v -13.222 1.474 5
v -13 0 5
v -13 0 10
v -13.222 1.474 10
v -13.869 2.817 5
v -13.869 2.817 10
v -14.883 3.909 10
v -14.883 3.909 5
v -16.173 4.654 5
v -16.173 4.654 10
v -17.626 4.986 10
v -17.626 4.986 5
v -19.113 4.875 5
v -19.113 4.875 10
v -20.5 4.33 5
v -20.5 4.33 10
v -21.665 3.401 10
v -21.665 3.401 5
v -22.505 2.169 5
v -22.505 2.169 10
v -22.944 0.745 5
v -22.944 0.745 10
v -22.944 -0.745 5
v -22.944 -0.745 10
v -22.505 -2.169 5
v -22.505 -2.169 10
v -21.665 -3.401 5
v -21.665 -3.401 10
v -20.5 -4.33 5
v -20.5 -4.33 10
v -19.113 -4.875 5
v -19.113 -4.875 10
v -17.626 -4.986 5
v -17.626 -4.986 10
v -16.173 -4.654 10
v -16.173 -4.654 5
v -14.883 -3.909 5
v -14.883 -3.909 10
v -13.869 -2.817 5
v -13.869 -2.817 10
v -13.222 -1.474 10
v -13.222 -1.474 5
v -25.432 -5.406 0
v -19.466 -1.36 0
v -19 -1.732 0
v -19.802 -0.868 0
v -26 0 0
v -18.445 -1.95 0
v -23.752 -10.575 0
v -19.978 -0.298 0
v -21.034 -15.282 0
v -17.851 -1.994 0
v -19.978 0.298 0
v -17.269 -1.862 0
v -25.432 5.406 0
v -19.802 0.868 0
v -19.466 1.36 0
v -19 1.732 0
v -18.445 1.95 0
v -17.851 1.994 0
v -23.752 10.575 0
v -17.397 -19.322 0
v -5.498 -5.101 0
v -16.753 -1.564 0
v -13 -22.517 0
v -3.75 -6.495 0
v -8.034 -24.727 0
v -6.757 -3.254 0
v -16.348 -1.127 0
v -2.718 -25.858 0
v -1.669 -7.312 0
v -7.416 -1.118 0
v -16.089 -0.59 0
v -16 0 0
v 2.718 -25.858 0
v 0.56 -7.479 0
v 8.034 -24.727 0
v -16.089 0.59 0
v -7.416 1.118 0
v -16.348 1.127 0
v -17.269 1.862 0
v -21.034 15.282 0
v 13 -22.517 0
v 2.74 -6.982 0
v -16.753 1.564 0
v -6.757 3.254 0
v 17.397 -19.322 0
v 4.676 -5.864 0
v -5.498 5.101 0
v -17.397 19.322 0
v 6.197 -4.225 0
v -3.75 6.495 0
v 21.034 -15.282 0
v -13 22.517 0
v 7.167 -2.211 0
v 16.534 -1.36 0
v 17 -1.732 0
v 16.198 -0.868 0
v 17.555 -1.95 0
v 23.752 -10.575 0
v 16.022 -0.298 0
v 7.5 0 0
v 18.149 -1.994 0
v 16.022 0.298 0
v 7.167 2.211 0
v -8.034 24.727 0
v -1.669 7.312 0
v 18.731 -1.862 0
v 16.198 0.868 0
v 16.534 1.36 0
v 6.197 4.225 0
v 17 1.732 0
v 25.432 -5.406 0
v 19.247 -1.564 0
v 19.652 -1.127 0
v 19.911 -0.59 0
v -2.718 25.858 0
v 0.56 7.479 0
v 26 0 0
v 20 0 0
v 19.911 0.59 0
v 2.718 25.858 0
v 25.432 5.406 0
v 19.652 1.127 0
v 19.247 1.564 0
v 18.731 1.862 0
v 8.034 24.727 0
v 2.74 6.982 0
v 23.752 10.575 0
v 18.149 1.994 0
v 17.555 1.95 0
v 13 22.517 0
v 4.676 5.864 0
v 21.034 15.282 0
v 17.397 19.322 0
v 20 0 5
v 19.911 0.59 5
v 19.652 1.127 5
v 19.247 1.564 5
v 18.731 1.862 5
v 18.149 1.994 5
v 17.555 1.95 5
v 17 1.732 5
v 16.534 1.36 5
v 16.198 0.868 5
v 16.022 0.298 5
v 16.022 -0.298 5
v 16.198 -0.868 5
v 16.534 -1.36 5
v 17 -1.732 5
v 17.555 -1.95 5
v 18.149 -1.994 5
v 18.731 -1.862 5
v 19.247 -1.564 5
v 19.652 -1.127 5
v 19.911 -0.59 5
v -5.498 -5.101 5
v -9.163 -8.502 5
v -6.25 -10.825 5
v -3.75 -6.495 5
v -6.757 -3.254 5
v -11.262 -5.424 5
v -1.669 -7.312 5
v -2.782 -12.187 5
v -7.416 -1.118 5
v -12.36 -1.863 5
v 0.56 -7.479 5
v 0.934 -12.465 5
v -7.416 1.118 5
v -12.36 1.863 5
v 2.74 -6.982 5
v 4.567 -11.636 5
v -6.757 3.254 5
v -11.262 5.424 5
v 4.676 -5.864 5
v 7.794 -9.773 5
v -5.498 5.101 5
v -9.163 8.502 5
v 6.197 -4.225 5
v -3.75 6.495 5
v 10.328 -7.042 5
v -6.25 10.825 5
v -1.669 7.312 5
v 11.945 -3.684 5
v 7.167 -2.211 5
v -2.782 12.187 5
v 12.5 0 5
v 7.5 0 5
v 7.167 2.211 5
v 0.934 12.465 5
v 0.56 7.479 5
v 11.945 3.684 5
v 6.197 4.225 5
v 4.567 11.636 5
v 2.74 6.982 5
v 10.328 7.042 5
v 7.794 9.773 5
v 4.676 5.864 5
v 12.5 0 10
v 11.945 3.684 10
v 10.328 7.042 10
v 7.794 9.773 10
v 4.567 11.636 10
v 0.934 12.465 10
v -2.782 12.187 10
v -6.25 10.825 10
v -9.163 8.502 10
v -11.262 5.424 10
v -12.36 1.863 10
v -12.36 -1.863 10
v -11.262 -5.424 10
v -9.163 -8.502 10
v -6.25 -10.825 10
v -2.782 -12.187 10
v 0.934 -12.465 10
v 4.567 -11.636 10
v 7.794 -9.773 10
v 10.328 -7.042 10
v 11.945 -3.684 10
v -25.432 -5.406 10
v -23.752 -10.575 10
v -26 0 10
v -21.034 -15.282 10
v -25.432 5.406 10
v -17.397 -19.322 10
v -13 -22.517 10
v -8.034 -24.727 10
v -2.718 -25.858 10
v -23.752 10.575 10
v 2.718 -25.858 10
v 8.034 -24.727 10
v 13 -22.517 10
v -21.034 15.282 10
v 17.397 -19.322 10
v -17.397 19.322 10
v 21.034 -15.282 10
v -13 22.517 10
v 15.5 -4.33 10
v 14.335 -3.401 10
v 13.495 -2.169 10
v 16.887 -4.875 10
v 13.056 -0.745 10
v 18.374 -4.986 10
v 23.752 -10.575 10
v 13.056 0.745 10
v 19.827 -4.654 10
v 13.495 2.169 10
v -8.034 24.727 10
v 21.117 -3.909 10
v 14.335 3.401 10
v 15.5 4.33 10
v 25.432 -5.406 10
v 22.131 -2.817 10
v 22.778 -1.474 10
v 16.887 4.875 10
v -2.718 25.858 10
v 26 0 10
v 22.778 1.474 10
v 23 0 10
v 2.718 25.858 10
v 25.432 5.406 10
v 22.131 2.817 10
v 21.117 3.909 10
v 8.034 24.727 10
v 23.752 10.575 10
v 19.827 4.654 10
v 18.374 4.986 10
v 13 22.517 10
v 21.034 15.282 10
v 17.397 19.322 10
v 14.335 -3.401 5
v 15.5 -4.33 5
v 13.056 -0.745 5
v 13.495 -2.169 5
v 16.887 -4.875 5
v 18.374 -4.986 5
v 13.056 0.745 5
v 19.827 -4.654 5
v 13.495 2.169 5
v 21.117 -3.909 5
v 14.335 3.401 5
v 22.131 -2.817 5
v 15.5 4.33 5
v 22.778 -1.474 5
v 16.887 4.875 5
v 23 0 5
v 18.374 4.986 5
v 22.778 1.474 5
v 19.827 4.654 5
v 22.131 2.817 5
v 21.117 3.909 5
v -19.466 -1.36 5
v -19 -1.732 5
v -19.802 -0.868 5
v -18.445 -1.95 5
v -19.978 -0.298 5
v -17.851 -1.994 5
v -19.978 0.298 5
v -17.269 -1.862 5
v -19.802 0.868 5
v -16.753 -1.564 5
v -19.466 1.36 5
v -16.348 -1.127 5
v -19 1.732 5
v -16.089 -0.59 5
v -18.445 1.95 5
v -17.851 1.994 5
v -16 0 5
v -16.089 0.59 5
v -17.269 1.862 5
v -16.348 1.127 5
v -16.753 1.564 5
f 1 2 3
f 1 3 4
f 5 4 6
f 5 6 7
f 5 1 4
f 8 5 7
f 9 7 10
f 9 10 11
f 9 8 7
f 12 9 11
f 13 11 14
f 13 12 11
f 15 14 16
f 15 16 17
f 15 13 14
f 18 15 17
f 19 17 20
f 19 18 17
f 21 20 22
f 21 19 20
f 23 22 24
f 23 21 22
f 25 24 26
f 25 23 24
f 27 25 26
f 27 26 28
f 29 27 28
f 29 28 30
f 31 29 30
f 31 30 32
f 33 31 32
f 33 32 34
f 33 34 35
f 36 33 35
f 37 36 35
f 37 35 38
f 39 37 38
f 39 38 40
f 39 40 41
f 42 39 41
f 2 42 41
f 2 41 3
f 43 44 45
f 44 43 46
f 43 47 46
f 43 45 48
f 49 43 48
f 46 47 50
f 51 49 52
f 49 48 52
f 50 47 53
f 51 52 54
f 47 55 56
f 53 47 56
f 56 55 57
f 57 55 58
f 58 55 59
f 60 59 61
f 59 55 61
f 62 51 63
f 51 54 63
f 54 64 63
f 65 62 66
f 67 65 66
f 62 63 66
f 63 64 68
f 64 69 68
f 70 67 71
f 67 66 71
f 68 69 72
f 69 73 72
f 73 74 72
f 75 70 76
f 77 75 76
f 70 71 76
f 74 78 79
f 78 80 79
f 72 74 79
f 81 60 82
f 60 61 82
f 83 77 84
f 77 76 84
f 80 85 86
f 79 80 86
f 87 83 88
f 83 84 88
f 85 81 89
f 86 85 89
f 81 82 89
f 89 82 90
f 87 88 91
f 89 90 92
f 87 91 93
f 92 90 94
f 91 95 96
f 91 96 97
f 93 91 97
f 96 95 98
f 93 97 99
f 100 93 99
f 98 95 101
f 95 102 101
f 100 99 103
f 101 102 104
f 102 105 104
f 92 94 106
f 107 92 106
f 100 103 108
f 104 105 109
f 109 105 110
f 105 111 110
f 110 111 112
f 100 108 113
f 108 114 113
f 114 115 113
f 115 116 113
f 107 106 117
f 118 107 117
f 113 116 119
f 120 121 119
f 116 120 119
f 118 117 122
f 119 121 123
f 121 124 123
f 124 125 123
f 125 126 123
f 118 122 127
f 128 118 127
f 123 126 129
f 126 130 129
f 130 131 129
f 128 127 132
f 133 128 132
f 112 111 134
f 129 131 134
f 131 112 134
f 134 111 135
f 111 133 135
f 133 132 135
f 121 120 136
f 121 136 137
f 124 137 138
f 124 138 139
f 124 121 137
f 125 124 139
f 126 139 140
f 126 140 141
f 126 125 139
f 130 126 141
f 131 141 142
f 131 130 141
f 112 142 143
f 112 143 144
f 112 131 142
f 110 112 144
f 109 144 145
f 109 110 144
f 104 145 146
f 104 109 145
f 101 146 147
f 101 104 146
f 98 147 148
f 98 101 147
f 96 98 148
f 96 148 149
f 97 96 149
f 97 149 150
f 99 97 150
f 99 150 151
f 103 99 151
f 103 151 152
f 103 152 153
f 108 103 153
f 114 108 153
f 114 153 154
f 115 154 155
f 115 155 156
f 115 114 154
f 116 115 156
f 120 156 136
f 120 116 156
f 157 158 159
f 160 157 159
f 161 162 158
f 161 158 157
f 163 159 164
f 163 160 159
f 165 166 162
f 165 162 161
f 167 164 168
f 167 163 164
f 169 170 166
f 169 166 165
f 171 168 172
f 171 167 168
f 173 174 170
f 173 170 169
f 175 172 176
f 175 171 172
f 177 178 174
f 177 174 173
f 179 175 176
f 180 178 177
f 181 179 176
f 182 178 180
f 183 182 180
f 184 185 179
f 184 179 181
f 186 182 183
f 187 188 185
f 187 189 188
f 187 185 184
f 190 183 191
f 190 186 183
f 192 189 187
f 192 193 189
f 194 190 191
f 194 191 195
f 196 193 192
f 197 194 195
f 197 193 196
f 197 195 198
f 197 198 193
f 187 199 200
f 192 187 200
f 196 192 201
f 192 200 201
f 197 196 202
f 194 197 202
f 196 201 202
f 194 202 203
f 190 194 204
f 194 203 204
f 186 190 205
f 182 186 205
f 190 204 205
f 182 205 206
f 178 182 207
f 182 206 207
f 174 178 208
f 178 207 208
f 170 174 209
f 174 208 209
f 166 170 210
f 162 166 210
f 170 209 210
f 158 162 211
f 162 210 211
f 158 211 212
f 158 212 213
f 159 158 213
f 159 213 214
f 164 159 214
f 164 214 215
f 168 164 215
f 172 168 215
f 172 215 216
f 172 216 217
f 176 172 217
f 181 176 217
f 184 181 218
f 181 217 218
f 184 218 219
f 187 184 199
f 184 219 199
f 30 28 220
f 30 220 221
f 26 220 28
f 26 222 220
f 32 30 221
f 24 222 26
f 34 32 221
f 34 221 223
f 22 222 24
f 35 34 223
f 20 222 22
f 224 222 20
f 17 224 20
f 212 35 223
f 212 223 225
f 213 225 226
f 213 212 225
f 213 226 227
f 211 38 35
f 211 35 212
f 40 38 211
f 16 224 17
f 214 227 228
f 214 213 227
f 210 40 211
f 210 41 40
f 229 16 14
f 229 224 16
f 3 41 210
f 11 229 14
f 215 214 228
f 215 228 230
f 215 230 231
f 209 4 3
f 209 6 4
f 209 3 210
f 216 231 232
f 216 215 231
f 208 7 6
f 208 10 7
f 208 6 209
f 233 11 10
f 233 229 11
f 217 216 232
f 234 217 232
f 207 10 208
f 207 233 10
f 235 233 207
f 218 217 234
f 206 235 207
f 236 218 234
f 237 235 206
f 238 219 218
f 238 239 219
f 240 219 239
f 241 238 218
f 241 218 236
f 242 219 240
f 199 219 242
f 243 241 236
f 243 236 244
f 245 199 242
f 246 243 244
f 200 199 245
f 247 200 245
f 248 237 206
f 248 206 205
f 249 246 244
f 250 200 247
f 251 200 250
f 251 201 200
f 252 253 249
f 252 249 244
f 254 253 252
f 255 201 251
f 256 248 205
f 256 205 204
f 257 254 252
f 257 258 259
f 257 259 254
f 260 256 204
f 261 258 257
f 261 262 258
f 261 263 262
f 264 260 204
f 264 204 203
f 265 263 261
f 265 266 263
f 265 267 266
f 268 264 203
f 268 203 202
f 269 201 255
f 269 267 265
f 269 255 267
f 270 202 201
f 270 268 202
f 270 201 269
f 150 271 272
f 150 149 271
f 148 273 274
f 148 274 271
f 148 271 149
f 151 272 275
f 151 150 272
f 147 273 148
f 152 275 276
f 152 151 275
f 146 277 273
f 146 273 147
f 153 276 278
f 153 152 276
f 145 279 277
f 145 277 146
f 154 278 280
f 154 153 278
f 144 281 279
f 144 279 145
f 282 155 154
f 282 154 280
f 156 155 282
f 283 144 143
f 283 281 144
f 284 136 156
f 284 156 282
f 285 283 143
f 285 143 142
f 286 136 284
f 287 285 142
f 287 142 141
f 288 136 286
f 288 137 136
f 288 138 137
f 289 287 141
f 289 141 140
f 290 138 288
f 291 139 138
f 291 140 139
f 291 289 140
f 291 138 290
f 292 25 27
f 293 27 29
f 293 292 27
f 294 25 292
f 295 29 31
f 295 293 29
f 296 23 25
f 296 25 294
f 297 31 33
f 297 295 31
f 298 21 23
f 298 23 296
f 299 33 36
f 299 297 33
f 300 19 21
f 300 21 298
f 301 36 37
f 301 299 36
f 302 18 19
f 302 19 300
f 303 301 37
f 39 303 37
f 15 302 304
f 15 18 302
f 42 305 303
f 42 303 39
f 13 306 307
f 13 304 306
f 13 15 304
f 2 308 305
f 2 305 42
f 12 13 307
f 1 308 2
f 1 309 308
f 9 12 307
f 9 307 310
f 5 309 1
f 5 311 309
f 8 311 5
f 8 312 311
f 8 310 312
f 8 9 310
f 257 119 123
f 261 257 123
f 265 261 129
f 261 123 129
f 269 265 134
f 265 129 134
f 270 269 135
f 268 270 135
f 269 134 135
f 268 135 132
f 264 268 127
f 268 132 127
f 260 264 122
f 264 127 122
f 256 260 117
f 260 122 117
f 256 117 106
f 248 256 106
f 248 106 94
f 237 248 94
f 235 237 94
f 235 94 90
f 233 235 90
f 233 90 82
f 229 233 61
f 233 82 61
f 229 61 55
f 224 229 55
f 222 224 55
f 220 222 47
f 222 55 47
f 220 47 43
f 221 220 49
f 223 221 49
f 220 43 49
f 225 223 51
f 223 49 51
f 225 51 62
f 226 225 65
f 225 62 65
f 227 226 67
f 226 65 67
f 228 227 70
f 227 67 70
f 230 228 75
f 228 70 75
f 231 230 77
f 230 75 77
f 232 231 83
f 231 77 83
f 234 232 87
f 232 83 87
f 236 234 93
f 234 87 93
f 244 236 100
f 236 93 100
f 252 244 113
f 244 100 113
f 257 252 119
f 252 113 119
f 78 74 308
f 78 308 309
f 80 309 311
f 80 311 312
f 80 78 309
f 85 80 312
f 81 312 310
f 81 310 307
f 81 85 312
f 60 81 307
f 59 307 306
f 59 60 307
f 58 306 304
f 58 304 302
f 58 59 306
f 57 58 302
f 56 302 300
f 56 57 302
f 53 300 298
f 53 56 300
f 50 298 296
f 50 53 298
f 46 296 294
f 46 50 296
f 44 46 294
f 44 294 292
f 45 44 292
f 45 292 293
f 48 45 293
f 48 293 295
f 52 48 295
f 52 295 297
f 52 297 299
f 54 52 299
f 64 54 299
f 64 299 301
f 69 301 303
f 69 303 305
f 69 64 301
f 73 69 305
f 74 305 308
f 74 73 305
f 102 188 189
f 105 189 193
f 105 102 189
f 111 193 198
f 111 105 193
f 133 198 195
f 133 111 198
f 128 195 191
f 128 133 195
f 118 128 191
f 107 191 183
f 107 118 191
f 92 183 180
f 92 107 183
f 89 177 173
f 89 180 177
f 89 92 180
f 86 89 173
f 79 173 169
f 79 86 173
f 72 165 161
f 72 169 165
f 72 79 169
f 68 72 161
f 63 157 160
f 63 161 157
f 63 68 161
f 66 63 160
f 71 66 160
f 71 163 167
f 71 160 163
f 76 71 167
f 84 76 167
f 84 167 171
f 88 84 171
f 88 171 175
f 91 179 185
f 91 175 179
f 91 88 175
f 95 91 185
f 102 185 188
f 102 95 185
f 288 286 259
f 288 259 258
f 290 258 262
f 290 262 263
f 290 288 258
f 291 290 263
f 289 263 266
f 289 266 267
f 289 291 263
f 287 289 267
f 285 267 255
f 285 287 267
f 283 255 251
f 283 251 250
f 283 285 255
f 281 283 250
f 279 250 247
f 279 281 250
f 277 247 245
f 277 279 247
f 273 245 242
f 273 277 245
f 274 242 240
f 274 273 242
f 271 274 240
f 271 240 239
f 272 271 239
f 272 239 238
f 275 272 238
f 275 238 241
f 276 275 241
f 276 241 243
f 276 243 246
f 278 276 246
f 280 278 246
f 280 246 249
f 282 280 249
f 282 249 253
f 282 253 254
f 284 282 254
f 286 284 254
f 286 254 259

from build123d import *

# Parameters (mm, degrees)
SKETCH_4_R          = 26
SKETCH_4_R_2        = 5
SKETCH_4_R_3        = 7.5
EXTRUDE_2_DEPTH     = 10
SKETCH_4_4_R        = 5
SKETCH_4_4_R_2      = 2
EXTRUDE_3_DEPTH     = 5
SKETCH_5_R          = 12.5
CUT_EXTRUDE_3_DEPTH = 5


with BuildPart() as part:
    # 草图4 → 凸台-拉伸2 (new body)
    with BuildSketch(Plane.XY):
        Circle(SKETCH_4_R)
        with Locations((-18, 0)):
            Circle(SKETCH_4_R_2, mode=Mode.SUBTRACT)
        Circle(SKETCH_4_R_3, mode=Mode.SUBTRACT)
        with Locations((18, 0)):
            Circle(SKETCH_4_R_2, mode=Mode.SUBTRACT)
    extrude(amount=EXTRUDE_2_DEPTH)

    # 草图4<4> → 凸台-拉伸3 (add)
    # profile 1 of 2: a face of its own
    with BuildSketch(Plane.XY):
        with Locations((-18, 0)):
            Circle(SKETCH_4_4_R)
        with Locations((-18, 0)):
            Circle(SKETCH_4_4_R_2, mode=Mode.SUBTRACT)
    # profile 2 of 2: a face of its own
    with BuildSketch(Plane.XY):
        with Locations((18, 0)):
            Circle(SKETCH_4_4_R)
        with Locations((18, 0)):
            Circle(SKETCH_4_4_R_2, mode=Mode.SUBTRACT)
    extrude(amount=EXTRUDE_3_DEPTH)

    # 草图5 → 切除-拉伸3 (cut)
    with BuildSketch(Plane.XY.offset(10)):
        Circle(SKETCH_5_R)
    extrude(amount=-CUT_EXTRUDE_3_DEPTH, mode=Mode.SUBTRACT)


solid = part.part
